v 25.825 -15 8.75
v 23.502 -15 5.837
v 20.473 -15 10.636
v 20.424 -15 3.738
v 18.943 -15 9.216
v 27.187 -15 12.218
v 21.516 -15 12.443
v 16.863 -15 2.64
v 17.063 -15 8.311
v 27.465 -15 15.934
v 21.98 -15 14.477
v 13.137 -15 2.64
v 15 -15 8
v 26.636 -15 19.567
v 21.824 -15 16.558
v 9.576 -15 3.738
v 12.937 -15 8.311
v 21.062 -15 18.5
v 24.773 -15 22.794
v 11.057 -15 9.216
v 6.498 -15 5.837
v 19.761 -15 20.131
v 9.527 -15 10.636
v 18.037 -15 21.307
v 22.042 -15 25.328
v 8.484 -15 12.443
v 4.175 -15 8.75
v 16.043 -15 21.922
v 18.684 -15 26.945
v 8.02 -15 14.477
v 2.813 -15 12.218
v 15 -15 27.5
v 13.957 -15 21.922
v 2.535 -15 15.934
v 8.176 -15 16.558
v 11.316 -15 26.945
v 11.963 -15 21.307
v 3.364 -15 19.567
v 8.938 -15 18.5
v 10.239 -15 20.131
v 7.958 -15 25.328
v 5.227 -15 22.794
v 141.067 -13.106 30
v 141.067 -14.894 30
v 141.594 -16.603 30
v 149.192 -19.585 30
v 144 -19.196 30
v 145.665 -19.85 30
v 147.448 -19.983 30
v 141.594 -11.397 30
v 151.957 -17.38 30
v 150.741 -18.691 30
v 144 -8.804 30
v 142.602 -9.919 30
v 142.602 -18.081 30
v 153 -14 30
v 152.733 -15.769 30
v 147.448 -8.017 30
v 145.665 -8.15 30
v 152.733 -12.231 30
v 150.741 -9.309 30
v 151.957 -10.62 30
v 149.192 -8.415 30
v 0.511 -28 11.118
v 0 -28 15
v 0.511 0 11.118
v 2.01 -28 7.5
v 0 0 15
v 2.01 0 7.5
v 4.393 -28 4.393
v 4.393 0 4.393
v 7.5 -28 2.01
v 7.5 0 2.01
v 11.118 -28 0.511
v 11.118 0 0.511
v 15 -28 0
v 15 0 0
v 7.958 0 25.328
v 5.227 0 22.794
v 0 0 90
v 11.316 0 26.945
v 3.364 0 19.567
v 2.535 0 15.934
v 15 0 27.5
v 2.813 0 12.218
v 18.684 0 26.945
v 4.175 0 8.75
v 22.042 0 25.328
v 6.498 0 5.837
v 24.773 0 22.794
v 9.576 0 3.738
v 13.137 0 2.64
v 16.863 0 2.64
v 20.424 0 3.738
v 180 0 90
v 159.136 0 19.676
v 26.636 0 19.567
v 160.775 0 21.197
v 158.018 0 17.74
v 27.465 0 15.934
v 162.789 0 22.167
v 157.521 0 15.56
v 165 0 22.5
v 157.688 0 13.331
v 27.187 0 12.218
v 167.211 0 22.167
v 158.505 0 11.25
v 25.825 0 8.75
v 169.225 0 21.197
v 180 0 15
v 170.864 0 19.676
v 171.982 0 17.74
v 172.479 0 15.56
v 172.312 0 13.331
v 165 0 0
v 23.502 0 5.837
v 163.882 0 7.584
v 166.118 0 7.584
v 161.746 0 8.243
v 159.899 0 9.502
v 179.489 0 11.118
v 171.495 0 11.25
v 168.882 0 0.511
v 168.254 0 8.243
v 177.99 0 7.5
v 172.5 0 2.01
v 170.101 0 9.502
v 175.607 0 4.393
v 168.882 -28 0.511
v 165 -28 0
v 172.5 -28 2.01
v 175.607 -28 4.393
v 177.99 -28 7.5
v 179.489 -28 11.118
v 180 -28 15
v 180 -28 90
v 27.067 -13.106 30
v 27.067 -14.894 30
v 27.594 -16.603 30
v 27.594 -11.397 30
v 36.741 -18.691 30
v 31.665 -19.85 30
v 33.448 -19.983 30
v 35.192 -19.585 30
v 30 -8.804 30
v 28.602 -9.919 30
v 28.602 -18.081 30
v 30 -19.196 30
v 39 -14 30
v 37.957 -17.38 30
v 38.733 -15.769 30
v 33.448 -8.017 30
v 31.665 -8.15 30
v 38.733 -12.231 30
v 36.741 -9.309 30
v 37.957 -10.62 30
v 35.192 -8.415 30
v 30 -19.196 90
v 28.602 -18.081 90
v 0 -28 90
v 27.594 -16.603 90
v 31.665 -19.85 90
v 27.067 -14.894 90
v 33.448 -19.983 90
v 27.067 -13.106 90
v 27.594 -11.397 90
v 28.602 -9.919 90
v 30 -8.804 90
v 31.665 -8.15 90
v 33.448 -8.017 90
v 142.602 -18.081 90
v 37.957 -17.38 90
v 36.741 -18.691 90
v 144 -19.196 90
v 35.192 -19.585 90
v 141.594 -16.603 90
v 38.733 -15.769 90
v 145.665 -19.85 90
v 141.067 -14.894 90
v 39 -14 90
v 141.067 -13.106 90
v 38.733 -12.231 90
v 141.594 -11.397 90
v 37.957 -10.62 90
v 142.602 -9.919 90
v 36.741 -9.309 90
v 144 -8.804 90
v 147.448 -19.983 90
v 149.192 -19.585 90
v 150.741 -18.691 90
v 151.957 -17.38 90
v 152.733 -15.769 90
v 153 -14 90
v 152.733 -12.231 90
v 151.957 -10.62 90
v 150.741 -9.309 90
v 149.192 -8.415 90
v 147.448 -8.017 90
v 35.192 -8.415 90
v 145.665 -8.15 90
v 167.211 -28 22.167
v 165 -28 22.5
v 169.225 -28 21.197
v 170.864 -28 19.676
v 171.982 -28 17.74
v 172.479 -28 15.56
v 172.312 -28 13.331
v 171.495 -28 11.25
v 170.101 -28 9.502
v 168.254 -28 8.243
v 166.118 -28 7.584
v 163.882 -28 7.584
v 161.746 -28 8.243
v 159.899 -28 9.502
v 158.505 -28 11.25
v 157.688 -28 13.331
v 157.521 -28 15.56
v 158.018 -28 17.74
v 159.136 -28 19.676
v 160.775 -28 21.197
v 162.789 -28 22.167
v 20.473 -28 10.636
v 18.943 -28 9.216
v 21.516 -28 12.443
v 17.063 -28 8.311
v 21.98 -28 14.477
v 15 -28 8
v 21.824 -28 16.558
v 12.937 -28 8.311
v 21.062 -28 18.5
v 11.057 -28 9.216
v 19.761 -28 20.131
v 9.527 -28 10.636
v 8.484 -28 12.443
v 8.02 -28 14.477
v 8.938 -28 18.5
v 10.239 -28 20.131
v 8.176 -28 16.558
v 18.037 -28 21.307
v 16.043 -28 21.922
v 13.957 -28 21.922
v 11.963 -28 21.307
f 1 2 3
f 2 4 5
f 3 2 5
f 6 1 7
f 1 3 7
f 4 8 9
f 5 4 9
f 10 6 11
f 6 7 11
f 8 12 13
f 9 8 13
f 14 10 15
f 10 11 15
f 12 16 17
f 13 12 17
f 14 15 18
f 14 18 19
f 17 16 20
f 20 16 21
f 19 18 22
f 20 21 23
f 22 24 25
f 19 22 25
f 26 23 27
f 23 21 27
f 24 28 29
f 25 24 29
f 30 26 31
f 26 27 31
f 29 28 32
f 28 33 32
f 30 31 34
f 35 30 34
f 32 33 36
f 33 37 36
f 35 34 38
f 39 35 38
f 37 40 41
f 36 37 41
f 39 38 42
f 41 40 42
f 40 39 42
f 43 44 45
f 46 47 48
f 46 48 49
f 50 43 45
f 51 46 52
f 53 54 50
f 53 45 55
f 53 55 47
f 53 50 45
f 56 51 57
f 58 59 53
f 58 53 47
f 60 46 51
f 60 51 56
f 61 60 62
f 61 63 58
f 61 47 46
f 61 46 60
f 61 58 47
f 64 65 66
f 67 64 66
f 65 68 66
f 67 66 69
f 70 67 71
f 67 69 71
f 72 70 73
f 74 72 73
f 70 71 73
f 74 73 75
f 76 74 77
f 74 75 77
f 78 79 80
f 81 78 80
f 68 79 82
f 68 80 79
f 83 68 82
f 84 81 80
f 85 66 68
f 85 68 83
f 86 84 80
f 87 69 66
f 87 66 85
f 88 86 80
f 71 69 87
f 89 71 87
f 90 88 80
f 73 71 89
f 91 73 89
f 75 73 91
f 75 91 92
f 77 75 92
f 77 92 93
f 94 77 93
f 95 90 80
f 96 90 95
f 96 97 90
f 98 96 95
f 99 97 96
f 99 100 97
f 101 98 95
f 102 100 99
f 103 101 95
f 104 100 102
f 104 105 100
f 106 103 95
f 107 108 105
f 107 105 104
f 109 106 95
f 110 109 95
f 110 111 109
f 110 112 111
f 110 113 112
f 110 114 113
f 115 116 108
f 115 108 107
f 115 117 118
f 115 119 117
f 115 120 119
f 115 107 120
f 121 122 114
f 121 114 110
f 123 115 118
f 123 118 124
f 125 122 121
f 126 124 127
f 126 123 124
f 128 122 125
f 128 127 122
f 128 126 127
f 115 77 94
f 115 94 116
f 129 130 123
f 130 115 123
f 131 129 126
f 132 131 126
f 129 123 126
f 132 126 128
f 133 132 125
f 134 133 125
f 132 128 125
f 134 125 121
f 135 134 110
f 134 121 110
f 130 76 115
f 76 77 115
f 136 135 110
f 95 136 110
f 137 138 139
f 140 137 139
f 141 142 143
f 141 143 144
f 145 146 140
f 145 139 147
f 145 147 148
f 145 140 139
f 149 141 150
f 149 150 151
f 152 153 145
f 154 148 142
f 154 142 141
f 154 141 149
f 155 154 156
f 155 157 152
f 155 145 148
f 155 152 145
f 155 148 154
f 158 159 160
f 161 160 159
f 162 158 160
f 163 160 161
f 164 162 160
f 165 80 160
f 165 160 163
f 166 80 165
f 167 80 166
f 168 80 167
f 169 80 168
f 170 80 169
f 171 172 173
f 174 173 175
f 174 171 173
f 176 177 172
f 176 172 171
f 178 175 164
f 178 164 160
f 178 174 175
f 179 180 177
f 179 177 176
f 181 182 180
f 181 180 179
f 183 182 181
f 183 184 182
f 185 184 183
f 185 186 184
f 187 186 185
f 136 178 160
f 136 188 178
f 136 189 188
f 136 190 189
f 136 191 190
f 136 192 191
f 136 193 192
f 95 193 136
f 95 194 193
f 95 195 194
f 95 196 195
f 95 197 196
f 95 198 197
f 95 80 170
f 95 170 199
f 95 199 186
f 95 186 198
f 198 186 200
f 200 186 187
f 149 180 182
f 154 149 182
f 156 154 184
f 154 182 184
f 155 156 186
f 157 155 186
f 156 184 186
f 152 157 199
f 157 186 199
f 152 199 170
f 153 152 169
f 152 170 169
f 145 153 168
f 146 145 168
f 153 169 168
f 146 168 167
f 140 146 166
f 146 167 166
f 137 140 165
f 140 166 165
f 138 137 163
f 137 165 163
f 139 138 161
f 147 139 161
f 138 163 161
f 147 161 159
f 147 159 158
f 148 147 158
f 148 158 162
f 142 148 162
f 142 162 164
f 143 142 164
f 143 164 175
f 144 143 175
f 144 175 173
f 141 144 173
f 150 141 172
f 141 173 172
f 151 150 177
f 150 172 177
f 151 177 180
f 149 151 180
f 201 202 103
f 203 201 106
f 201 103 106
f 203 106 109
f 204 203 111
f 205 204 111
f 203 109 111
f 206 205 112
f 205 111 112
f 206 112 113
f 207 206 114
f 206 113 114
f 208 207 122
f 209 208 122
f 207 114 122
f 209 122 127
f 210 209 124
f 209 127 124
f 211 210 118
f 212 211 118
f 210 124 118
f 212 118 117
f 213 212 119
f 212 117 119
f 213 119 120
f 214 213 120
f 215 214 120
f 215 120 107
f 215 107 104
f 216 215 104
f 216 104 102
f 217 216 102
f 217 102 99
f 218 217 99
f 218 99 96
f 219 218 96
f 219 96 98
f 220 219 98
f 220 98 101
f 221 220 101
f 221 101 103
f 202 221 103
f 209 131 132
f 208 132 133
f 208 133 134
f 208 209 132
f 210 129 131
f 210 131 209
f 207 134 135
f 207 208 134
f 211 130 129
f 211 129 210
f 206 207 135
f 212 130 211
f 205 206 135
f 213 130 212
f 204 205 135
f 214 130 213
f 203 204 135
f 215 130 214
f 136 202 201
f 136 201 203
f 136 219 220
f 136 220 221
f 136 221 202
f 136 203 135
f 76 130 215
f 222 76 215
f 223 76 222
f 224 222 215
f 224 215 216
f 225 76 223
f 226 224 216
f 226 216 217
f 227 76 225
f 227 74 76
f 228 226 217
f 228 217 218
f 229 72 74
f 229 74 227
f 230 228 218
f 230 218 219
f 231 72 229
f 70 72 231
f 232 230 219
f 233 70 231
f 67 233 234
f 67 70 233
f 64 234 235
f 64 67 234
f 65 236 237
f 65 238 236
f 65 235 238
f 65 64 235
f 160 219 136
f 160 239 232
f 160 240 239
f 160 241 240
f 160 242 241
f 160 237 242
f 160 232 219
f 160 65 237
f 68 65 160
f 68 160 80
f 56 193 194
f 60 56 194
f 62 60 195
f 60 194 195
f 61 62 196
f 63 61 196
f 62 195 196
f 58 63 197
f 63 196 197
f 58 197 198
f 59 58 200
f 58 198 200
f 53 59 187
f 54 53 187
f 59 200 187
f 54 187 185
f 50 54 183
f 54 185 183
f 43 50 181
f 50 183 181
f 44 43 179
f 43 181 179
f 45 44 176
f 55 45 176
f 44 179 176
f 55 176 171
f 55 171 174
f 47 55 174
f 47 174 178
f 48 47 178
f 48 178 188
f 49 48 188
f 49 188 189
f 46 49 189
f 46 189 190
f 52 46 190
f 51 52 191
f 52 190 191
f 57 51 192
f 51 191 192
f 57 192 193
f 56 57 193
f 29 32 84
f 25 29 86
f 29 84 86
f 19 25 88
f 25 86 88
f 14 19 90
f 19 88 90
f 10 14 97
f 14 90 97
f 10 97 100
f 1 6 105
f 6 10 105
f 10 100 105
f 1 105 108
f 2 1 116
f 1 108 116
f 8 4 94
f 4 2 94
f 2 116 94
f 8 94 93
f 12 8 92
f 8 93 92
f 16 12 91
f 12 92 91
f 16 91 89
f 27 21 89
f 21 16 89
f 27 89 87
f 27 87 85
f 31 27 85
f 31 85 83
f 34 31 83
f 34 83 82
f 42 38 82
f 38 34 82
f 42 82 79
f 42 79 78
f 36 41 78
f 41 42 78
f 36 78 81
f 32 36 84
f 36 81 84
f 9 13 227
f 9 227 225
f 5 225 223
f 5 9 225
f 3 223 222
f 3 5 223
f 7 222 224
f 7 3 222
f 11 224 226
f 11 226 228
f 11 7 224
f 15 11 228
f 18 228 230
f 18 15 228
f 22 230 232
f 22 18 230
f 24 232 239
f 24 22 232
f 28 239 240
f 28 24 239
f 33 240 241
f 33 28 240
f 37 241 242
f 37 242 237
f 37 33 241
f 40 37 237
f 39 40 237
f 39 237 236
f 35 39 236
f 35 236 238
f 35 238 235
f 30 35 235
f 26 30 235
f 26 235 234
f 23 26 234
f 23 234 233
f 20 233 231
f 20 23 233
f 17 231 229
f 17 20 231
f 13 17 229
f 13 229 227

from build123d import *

# Parameters (mm, degrees)
SKETCH_1_W          = 180
SKETCH_1_H          = 28
EXTRUDE_1_DEPTH     = 90
SKETCH_2_R          = 6
CUT_EXTRUDE_1_DEPTH = 60
SKETCH_3_R          = 12.5
SKETCH_3_R_2        = 7.5
CUT_EXTRUDE_2_DEPTH = 30
FILLET_1_R          = 15
EXTRUDE_START       = -13
SKETCH_4_R          = 12.5
SKETCH_4_R_2        = 7
EXTRUDE_2_DEPTH     = 13


with BuildPart() as part:
    # 草图1 → 拉伸1 (new body)
    with BuildSketch(Plane.XY):
        with Locations((90, -14)):
            Rectangle(SKETCH_1_W, SKETCH_1_H)
    extrude(amount=EXTRUDE_1_DEPTH)

    # 草图2 → 切除-拉伸1 (cut)
    with BuildSketch(Plane.XY.offset(90)):
        with Locations((33, -14)):
            Circle(SKETCH_2_R)
        with Locations((147, -14)):
            Circle(SKETCH_2_R)
    extrude(amount=-CUT_EXTRUDE_1_DEPTH, mode=Mode.SUBTRACT)

    # 草图3 → 切除-拉伸2 (cut)
    with BuildSketch(Plane(origin=(0, 0, 0), x_dir=(1, 0, 0), z_dir=(0, 1, 0))):
        with Locations(Location((15, -15, 0), (0, 0, 270))):
            Circle(SKETCH_3_R)
        with Locations(Location((165, -15, 0), (0, 0, 270))):
            Circle(SKETCH_3_R_2)
    extrude(amount=-CUT_EXTRUDE_2_DEPTH, mode=Mode.SUBTRACT)

    # 圆角1
    fillet_1_edges = [part.edges().sort_by_distance(p)[0] for p in [
        (180, -14, 0),
        (0, -14, 0),
    ]]
    fillet(fillet_1_edges, radius=FILLET_1_R)

    # 草图4 → 拉伸2 (add)
    with BuildSketch(Plane.XZ.offset(28).offset(EXTRUDE_START)):
        with Locations(Location((15, 15, 0), (0, 0, 90))):
            Circle(SKETCH_4_R)
        with Locations(Location((15, 15, 0), (0, 0, 270))):
            Circle(SKETCH_4_R_2, mode=Mode.SUBTRACT)
    extrude(amount=EXTRUDE_2_DEPTH)


solid = part.part
